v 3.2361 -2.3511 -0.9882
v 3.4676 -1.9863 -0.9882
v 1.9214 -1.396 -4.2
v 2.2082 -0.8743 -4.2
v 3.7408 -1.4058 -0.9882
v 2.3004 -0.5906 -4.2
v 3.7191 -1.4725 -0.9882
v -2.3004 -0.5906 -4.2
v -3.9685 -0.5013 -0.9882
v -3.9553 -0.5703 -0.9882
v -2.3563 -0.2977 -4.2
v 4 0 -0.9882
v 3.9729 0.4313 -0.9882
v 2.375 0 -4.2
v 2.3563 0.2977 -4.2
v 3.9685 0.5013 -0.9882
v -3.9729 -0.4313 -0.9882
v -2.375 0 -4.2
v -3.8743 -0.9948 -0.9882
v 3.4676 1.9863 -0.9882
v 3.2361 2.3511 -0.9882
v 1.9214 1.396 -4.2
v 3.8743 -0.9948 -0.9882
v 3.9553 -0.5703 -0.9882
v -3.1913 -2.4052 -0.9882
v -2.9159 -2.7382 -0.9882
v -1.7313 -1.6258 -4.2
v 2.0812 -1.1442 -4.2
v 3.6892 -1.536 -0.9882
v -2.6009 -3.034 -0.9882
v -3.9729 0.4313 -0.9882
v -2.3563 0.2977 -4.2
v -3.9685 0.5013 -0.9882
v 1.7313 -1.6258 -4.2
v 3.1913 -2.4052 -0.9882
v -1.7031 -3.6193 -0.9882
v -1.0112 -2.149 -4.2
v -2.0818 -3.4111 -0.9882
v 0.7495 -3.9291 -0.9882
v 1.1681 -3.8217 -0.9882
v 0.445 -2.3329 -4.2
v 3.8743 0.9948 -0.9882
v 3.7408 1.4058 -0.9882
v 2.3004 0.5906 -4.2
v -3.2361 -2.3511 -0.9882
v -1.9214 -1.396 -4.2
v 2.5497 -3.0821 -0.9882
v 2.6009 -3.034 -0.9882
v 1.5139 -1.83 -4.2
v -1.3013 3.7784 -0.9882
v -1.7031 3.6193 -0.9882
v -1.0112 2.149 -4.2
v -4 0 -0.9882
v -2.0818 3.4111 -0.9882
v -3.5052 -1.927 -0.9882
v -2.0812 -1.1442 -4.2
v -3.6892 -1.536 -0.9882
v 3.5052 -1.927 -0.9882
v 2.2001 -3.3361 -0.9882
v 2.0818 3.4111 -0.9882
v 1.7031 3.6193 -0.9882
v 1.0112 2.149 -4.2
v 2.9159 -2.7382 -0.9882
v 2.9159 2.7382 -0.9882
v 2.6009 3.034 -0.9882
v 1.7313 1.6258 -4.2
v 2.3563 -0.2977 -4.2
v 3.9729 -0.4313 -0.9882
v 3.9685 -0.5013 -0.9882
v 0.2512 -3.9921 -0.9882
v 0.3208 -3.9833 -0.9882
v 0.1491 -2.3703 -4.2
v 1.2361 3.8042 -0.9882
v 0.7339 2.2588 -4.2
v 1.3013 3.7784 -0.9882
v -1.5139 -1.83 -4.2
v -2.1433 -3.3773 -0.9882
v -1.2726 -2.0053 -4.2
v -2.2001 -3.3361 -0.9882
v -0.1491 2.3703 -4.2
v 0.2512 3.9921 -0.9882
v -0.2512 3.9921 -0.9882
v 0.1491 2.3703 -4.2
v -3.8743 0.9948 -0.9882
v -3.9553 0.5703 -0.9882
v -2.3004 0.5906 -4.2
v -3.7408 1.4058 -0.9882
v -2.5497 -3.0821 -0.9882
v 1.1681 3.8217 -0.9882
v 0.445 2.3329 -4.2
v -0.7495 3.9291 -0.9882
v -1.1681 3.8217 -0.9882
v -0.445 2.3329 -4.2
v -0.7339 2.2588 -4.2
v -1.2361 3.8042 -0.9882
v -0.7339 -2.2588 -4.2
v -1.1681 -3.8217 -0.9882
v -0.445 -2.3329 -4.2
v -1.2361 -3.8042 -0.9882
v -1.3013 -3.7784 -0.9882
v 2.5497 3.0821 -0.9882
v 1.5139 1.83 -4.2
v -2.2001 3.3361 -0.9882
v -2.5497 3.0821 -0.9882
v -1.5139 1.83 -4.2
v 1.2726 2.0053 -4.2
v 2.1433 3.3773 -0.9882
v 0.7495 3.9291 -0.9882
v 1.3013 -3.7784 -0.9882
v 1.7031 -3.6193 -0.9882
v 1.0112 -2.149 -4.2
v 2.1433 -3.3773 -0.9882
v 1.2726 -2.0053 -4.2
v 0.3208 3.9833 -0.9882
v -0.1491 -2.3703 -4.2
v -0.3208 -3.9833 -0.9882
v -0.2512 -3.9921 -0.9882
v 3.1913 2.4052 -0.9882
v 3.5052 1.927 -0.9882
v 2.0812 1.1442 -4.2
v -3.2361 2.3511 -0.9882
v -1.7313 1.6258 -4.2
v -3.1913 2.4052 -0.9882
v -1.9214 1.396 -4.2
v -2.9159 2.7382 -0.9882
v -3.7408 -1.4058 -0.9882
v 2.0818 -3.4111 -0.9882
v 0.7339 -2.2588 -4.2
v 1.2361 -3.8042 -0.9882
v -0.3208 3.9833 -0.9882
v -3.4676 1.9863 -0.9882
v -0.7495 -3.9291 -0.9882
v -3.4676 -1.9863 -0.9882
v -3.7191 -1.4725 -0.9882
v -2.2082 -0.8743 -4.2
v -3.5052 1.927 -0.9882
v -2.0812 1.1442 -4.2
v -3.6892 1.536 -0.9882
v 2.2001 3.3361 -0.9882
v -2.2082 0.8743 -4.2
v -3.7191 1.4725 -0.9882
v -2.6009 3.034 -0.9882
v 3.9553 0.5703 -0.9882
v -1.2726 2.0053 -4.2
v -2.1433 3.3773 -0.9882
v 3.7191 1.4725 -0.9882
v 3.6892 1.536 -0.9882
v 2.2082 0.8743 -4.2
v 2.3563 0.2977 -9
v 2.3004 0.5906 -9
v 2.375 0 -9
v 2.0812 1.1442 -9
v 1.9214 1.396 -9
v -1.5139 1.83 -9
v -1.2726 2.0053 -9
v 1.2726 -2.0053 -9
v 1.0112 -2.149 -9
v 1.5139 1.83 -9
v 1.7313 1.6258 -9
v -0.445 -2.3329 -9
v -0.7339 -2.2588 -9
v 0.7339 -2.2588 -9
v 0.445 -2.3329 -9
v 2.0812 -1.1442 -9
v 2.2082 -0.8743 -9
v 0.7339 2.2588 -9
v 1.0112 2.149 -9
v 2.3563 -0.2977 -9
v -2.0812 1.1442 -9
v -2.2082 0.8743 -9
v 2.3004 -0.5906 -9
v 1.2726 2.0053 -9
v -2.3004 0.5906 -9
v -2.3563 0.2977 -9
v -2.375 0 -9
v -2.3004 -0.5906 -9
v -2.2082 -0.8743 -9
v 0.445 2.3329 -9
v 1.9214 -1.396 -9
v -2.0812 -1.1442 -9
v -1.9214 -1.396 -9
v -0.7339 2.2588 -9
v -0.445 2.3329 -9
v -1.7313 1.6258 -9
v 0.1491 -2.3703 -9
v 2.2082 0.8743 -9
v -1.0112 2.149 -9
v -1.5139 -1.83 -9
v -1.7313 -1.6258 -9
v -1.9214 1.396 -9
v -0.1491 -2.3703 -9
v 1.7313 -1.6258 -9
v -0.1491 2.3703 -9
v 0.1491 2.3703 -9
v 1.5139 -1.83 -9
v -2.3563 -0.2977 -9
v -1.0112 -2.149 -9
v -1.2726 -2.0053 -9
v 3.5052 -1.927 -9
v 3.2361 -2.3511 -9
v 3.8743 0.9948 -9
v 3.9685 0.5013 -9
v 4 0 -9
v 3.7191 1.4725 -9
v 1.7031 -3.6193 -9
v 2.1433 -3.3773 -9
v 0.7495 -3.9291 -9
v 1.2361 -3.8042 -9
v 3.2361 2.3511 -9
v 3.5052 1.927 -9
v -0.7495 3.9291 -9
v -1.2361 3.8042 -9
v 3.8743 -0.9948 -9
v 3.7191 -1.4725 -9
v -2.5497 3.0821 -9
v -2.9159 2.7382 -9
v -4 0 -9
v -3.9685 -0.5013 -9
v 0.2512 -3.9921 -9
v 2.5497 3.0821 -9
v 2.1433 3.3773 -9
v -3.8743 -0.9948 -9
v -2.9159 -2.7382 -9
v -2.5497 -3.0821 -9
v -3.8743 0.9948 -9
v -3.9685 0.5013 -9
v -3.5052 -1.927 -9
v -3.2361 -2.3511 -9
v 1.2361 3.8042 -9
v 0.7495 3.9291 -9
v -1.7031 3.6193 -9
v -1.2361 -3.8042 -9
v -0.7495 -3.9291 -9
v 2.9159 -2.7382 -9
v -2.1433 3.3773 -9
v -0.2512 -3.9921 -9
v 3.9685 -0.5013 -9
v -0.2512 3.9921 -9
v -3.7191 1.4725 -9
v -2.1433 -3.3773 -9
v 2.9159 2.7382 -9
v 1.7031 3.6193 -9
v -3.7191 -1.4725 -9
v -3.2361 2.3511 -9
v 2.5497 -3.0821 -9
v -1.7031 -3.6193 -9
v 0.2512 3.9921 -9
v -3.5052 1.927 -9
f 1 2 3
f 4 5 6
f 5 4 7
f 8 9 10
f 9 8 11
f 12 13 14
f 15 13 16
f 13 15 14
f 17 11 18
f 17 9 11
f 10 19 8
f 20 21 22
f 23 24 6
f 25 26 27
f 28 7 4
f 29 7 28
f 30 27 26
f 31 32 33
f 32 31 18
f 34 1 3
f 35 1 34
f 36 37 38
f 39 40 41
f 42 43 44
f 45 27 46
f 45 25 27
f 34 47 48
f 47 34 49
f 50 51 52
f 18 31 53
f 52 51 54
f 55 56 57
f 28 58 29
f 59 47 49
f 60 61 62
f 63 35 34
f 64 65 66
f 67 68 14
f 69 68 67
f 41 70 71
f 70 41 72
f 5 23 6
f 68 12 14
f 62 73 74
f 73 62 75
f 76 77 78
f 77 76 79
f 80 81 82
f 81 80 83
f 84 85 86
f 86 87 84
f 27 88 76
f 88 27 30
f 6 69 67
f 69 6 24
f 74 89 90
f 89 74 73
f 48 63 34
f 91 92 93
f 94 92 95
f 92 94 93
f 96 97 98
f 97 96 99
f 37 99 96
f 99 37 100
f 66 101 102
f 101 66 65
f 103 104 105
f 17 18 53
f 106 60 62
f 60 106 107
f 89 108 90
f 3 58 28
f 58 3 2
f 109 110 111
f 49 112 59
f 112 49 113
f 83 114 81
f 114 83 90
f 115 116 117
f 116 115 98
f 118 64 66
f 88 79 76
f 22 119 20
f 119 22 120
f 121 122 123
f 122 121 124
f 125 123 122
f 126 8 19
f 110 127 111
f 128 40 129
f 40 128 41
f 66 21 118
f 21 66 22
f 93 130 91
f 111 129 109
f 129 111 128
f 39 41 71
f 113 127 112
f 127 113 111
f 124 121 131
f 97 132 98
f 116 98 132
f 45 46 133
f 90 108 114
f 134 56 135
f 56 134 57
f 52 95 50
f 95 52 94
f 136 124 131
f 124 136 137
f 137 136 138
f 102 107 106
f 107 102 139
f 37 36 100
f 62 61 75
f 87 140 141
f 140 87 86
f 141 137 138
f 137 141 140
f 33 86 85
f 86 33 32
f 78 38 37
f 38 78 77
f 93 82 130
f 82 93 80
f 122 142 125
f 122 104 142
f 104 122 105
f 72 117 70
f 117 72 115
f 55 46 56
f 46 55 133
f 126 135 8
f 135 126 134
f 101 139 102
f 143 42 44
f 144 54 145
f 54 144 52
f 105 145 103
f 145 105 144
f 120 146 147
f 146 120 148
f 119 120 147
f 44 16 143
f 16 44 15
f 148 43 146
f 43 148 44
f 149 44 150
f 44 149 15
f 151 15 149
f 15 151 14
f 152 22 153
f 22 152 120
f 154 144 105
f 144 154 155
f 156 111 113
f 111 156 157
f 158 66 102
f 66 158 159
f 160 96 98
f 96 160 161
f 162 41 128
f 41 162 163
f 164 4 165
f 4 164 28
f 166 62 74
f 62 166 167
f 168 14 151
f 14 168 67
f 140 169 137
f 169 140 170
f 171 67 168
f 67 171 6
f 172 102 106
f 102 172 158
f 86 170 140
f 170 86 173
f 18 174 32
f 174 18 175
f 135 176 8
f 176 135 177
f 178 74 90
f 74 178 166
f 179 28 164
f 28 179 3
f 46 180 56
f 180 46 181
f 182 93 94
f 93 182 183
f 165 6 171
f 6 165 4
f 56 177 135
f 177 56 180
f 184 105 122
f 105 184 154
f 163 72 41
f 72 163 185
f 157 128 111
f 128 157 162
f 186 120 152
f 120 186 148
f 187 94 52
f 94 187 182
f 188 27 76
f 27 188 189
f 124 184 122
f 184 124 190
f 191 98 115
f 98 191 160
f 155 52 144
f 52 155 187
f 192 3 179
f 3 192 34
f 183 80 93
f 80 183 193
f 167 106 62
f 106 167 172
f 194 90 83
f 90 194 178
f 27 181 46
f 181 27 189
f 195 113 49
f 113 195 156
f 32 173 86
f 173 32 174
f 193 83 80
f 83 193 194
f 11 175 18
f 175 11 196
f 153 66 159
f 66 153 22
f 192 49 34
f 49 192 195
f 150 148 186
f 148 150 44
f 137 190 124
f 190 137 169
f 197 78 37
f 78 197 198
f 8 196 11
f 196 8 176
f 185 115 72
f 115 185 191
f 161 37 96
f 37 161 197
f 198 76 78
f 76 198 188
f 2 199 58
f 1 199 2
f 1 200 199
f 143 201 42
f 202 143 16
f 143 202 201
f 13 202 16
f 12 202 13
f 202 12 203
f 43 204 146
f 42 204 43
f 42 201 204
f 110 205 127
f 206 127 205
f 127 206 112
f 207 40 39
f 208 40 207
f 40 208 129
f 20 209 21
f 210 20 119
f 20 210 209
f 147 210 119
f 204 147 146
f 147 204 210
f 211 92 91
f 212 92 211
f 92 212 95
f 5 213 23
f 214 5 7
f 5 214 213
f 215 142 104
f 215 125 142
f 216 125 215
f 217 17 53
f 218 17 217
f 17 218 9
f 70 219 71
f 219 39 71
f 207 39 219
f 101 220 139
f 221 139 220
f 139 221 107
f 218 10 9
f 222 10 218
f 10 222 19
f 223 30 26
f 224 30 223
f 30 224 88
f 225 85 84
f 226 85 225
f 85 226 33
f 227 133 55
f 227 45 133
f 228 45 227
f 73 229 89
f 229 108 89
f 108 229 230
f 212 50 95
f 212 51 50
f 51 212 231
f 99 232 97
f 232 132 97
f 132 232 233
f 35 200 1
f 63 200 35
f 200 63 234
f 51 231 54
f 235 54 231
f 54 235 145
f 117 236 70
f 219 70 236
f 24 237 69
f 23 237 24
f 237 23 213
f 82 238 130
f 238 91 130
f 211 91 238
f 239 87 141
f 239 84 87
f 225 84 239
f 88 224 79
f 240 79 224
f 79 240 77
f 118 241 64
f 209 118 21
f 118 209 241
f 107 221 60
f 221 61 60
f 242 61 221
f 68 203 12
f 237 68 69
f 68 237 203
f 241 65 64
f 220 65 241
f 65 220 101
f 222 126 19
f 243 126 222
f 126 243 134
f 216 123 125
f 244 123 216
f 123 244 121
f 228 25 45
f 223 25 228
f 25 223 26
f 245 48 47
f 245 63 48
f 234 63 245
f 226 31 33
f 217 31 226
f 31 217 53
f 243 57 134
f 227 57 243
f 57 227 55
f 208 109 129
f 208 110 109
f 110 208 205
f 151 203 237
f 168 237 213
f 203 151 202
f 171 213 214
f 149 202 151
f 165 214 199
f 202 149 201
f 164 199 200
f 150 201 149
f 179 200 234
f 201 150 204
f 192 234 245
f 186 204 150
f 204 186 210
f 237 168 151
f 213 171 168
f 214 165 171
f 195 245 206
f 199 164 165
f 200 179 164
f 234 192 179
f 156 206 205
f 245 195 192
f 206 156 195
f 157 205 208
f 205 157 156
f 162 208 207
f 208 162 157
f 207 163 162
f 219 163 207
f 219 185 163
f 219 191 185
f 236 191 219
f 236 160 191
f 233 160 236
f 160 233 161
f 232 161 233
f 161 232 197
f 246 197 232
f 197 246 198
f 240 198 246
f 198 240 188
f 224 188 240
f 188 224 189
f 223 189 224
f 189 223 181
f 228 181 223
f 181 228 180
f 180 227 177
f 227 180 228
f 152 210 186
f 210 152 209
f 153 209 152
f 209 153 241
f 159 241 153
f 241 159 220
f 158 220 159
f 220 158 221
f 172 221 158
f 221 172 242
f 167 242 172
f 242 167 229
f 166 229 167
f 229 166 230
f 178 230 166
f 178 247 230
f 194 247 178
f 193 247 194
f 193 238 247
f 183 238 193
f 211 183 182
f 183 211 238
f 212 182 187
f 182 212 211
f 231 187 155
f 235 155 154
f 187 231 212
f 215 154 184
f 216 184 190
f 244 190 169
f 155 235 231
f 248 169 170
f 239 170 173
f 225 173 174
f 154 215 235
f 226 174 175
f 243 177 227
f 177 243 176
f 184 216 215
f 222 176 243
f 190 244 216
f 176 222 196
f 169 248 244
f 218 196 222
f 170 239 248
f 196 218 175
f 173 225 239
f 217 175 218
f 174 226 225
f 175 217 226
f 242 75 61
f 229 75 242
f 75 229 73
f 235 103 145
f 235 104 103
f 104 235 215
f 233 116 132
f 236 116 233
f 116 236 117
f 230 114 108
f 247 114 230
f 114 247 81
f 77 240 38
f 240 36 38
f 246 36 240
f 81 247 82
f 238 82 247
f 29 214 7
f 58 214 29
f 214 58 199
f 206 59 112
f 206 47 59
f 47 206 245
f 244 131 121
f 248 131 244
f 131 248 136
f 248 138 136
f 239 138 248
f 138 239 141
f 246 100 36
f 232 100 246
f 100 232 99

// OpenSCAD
$fn = 50;

difference() {
	union() {
		translate(v = [0, 0, -9.0]) {
			cylinder(h = 9, r = 4.0);
		}
	}
	union() {
		translate(v = [0, 0, 0]) {
			rotate(a = [0, 0, 0]) {
				difference() {
					union() {
						translate(v = [0, 0, -12.0]) {
							cylinder(h = 12, r = 2.25);
						}
						translate(v = [0, 0, -4.2]) {
							cylinder(h = 4.2, r1 = 2.375, r2 = 4.5);
						}
						translate(v = [0, 0, -12.0]) {
							cylinder(h = 12, r = 2.375);
						}
						translate(v = [0, 0, -12.0]) {
							cylinder(h = 12, r = 2.25);
						}
					}
					union();
				}
			}
		}
	}
}
